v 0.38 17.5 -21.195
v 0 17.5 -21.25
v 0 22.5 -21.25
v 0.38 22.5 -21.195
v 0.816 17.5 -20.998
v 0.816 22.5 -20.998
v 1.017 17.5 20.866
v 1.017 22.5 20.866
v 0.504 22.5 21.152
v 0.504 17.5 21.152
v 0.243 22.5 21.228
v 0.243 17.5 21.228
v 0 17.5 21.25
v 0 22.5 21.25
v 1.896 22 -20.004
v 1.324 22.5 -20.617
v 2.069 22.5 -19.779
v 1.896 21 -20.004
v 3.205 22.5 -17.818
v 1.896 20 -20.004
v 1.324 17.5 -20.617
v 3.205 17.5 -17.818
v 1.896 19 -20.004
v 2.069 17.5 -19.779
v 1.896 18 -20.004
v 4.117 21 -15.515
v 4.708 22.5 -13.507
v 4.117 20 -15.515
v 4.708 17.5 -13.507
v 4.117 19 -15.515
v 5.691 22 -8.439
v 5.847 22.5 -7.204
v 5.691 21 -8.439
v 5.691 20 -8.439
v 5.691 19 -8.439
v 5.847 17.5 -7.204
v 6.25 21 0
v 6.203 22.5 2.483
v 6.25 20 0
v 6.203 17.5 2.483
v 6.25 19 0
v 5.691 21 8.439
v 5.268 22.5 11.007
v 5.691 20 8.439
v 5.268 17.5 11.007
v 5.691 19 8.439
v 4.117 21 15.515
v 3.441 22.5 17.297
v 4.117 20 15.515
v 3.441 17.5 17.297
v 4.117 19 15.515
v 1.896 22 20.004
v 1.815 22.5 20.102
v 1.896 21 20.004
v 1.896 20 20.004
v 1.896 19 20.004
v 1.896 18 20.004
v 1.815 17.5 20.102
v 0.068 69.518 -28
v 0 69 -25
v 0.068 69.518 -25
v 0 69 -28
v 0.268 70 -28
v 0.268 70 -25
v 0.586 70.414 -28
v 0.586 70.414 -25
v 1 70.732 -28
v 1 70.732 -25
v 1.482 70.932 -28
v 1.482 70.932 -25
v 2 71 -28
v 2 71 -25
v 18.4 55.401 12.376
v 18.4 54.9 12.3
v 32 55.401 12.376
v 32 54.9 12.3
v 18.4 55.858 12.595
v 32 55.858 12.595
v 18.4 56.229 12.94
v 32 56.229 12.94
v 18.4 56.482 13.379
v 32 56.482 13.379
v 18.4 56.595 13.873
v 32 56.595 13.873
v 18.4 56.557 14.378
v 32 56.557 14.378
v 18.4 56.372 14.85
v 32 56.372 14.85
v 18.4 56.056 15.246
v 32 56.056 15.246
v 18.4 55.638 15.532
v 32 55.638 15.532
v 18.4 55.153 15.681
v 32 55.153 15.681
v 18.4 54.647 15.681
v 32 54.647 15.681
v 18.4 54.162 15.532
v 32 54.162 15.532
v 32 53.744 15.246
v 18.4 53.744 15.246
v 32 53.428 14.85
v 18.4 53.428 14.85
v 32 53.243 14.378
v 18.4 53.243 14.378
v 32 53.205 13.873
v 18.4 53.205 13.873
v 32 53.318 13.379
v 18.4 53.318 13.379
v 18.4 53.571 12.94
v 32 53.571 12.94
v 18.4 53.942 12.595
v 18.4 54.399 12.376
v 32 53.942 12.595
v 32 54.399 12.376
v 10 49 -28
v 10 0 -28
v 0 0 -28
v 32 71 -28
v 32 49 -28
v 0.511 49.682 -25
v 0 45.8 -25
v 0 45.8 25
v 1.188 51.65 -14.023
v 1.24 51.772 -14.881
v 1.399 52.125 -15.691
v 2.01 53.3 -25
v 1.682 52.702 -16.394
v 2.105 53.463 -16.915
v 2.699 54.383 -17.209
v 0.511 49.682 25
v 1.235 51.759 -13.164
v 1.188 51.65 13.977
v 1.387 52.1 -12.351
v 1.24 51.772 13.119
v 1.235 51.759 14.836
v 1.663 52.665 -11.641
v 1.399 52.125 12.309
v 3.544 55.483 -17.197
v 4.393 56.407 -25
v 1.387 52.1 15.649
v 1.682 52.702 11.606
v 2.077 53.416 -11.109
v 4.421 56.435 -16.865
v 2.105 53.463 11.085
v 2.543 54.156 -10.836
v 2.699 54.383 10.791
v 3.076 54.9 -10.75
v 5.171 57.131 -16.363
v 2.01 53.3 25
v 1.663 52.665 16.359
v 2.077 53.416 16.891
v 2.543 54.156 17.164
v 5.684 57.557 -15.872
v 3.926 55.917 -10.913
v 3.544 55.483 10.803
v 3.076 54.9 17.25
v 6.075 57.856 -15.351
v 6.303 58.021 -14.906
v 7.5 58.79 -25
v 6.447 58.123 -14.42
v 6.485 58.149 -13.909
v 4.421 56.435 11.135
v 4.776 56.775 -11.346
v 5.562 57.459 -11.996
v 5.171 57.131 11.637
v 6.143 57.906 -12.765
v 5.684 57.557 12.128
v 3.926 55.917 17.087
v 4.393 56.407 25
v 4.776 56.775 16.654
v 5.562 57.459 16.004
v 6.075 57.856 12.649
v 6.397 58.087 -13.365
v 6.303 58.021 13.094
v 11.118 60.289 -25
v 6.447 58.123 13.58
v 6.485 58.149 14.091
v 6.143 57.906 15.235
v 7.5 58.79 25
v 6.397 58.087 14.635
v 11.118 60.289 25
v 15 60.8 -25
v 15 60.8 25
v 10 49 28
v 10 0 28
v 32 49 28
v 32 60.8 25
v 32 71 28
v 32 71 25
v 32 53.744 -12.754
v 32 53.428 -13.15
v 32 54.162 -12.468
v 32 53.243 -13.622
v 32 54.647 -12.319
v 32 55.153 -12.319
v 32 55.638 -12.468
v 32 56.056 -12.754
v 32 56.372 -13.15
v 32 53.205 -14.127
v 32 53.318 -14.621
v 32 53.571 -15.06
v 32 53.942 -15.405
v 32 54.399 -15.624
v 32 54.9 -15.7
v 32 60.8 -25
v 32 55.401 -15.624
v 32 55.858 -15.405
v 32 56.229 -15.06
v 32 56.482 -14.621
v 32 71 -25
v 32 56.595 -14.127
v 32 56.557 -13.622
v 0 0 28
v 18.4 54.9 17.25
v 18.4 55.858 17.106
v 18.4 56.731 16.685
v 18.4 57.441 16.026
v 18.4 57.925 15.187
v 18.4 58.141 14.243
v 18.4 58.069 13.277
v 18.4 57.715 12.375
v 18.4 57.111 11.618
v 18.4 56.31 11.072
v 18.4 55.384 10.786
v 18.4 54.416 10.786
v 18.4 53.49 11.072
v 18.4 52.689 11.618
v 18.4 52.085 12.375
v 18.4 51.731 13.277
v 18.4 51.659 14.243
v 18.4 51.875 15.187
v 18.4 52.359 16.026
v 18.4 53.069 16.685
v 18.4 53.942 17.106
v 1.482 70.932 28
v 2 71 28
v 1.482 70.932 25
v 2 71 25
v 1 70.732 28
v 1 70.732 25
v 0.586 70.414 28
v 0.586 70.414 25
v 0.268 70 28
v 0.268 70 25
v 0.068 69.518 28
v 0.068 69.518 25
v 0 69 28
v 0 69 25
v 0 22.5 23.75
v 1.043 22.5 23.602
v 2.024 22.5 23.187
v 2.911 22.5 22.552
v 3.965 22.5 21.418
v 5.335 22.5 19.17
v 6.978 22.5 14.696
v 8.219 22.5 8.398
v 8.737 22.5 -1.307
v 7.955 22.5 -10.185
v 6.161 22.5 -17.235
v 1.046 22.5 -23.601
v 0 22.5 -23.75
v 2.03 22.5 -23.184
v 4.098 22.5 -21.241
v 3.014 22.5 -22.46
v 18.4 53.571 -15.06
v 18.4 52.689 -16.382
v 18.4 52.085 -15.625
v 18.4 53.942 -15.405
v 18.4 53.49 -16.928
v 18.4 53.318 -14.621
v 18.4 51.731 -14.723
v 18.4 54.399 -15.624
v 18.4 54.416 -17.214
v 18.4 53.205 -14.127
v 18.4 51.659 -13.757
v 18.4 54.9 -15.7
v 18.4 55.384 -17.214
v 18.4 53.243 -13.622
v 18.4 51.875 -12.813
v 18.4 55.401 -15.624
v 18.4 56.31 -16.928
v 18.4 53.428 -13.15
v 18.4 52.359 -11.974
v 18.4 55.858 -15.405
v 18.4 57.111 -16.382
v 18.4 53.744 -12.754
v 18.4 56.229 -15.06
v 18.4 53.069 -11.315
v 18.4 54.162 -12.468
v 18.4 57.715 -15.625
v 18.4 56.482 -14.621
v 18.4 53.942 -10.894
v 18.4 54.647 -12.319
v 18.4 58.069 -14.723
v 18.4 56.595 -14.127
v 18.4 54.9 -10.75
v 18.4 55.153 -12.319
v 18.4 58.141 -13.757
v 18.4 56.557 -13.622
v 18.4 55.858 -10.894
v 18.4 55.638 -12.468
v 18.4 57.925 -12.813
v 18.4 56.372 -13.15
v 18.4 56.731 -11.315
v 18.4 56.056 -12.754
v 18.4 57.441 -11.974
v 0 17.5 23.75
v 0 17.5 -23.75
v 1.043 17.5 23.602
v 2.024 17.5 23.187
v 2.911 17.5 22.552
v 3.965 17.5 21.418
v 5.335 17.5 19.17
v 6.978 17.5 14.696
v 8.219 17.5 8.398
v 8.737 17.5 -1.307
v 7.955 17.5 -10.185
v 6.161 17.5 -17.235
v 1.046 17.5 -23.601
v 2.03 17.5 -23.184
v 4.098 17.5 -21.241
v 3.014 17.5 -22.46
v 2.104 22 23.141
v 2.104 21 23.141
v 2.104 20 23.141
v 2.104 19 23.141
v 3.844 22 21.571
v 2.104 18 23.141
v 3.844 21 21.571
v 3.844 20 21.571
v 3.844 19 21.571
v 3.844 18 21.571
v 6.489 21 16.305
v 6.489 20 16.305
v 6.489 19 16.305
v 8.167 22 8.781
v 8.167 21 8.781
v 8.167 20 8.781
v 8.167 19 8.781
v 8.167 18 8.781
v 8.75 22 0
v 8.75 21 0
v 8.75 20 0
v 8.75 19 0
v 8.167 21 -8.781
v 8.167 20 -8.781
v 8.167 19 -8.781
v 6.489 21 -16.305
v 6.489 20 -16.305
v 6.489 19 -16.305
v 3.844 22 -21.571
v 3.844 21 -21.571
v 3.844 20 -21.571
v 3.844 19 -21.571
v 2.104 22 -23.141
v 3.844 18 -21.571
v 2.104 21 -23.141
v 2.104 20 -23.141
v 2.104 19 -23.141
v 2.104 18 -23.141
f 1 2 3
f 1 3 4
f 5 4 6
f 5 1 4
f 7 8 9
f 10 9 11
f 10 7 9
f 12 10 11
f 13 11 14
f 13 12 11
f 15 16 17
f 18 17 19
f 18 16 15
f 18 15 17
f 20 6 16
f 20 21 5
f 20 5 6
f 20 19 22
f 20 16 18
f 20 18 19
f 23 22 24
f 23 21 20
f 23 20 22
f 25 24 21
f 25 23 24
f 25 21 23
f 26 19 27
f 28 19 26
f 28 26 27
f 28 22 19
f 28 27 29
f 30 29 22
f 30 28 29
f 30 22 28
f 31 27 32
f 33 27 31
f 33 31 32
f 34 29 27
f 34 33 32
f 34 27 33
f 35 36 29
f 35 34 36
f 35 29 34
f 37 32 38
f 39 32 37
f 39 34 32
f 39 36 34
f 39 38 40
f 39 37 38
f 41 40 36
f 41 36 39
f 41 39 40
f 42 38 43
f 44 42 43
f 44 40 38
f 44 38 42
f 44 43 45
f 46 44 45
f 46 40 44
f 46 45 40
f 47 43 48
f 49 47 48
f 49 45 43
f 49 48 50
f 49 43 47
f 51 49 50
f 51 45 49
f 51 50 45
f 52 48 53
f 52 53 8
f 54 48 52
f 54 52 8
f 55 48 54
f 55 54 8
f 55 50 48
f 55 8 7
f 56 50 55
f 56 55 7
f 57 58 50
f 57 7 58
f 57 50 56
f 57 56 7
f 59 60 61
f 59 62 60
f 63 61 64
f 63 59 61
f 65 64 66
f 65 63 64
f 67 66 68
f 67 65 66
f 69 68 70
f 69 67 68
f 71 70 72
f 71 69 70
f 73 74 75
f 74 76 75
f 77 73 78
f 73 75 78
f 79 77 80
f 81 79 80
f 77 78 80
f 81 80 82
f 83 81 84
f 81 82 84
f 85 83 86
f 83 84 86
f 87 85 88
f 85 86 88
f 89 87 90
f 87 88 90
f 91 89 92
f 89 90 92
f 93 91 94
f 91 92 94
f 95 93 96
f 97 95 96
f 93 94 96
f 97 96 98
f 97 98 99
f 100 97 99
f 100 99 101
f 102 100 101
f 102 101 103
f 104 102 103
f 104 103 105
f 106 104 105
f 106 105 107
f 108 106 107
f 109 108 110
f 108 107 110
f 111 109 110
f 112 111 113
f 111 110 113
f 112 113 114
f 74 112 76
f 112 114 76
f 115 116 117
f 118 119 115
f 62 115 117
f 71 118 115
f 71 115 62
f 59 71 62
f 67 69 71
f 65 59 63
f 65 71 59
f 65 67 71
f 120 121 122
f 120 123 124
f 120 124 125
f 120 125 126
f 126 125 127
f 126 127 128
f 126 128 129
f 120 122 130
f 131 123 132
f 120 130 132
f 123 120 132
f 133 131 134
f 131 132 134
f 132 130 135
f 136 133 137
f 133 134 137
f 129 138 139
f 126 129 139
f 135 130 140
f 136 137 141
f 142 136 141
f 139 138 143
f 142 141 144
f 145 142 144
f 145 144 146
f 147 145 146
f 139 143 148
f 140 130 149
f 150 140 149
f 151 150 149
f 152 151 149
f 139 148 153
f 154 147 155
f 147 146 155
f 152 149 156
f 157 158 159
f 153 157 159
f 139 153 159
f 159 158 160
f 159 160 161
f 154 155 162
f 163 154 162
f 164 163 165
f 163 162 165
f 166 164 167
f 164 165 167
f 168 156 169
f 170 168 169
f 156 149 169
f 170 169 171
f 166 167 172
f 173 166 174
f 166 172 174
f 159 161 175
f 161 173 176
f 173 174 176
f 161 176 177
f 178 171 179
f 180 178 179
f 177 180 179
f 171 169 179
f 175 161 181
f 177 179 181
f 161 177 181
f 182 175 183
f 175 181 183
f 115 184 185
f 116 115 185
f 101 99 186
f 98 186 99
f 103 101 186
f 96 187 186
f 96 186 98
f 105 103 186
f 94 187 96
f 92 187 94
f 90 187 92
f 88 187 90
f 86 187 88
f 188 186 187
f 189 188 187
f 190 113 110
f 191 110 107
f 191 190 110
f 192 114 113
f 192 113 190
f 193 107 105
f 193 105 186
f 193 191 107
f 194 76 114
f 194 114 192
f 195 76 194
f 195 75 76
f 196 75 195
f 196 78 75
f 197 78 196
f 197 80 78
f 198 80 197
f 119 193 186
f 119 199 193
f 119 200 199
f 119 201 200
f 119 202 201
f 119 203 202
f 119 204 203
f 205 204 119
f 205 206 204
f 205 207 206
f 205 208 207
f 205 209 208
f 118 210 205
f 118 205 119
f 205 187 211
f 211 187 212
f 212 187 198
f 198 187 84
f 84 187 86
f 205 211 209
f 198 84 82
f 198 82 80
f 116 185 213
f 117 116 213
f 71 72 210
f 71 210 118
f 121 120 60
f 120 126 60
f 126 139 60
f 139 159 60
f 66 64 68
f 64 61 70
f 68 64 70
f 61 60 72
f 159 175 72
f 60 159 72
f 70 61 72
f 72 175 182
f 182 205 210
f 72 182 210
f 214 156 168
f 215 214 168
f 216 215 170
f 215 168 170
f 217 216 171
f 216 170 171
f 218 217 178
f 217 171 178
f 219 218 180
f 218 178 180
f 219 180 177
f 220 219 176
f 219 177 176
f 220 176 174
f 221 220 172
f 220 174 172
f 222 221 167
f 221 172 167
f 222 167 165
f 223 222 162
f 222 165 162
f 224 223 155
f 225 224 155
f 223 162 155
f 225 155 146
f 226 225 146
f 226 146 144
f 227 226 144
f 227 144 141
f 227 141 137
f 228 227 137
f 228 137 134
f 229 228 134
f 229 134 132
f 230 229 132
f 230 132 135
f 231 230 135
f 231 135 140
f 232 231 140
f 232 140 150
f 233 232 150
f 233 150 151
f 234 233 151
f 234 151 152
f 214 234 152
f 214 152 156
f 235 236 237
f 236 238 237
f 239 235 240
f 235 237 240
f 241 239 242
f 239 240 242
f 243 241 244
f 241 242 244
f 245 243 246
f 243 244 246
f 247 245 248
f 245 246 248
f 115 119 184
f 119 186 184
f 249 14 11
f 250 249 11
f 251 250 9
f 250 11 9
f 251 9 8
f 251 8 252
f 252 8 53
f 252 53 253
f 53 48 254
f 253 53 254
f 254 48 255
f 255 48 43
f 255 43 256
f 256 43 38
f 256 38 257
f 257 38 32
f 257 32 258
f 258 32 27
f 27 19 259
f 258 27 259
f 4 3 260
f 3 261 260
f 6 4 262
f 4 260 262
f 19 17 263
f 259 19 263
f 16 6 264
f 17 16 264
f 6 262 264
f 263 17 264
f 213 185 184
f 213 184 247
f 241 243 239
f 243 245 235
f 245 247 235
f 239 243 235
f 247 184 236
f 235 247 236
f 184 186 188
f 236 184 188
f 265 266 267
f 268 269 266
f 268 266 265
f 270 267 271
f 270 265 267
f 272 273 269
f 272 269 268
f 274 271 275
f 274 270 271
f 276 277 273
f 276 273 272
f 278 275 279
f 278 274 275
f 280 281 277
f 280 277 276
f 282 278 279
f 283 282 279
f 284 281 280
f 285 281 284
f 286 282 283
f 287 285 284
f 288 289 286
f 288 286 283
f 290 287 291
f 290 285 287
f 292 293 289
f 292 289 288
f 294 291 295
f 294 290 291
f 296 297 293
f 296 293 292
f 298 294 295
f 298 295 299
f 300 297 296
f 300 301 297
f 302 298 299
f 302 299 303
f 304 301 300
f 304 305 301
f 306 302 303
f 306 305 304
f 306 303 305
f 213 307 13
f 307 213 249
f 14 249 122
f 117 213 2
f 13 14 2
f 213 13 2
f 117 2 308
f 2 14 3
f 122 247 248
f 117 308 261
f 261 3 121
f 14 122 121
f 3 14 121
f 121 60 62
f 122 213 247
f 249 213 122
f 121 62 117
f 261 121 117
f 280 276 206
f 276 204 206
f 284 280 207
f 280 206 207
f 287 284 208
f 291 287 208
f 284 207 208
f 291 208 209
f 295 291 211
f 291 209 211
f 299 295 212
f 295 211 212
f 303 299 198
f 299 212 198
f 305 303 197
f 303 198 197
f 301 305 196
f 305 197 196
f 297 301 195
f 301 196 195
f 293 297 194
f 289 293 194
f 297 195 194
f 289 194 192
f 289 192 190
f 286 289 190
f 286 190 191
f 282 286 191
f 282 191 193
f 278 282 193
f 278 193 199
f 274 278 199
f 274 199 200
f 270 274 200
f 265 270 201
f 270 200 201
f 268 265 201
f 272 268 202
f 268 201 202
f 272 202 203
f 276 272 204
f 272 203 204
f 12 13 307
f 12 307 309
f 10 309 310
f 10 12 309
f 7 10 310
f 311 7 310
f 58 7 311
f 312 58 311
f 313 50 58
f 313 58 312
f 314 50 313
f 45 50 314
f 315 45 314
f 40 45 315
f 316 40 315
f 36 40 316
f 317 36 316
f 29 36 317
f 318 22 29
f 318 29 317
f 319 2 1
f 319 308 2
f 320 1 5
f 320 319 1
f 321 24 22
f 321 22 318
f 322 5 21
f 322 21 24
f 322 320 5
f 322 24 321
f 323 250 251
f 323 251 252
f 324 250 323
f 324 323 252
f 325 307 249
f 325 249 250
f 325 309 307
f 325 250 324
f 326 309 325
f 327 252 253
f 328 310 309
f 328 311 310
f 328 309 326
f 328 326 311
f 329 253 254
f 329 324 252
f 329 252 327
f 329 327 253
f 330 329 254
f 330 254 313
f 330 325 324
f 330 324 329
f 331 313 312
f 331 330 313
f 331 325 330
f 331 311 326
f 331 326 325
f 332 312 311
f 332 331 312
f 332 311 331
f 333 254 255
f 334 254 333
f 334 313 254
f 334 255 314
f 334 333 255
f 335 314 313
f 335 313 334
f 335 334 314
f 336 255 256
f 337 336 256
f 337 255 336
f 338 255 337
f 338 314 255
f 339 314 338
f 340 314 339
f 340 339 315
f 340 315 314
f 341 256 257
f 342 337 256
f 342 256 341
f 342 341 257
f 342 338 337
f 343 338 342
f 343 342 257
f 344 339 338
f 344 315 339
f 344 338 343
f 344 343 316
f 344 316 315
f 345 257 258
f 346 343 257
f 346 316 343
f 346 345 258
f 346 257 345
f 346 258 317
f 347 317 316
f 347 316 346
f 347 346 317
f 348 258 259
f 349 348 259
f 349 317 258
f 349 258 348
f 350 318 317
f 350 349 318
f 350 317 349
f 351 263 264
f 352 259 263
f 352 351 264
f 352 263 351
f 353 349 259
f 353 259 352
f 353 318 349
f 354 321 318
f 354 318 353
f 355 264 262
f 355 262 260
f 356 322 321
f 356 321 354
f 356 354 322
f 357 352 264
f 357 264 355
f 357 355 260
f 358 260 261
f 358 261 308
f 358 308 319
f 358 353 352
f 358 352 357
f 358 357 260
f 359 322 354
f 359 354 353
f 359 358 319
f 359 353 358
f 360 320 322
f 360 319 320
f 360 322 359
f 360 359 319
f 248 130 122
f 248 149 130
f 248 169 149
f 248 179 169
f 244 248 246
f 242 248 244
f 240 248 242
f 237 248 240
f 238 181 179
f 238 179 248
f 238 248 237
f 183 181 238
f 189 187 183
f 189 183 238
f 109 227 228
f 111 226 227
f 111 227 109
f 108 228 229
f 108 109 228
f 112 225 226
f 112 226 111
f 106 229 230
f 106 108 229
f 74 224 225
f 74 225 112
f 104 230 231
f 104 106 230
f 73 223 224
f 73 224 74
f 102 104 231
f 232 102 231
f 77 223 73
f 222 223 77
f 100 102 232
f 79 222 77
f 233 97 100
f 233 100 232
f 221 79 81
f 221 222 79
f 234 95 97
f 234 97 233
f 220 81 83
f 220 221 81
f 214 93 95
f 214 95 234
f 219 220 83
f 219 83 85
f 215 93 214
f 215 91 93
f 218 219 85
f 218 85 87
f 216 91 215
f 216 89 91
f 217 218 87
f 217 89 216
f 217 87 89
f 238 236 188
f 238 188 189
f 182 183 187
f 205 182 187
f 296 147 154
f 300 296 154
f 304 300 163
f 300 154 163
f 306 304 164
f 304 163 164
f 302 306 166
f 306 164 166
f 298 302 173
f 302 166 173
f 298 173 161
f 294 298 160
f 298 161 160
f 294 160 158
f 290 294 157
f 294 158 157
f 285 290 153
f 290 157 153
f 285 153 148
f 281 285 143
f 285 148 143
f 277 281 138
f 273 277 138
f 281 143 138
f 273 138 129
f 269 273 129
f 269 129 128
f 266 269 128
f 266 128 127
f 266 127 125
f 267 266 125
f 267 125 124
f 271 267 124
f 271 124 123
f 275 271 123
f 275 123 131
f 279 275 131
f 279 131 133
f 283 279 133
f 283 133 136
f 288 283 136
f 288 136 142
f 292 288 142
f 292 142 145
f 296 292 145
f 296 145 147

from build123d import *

# Parameters (mm, degrees)
BOSS_EXTRUDE1_DEPTH                                 = 28
CBORE_FOR_M3_HEX_SOCKET_HEAD_CAP_SCREW1_D           = 3.4
CBORE_FOR_M3_HEX_SOCKET_HEAD_CAP_SCREW1_CBORE_D     = 6.5
CBORE_FOR_M3_HEX_SOCKET_HEAD_CAP_SCREW1_CBORE_DEPTH = 18.4
SKETCH5_W                                           = 3
SKETCH5_H                                           = 10.2
BOSS_EXTRUDE3_DEPTH                                 = 32
FILLET1_R                                           = 15
CUT_SWEEP1_START                                    = 17.5
CUT_SWEEP1_DEPTH                                    = 5
FILLET2_R                                           = 2


# Read off the part's stored shape, not the designer's step: Cut-Sweep1
with BuildPart() as part:
    # Sketch1 → Boss-Extrude1 (new, symmetric)
    with BuildSketch(Plane.XY):
        Polygon((0, 0), (0, 60.8), (32, 60.8), (32, 49), (10, 49), (10, 0), align=None)
    extrude(amount=BOSS_EXTRUDE1_DEPTH, both=True)

    # CBORE for M3 Hex Socket Head Cap Screw1 (through all)
    with Locations(Plane.ZY):
        with Locations((14, 54.9), (-14, 54.9)):
            CounterBoreHole(CBORE_FOR_M3_HEX_SOCKET_HEAD_CAP_SCREW1_D / 2, CBORE_FOR_M3_HEX_SOCKET_HEAD_CAP_SCREW1_CBORE_D / 2, CBORE_FOR_M3_HEX_SOCKET_HEAD_CAP_SCREW1_CBORE_DEPTH)

    # Sketch5 → Boss-Extrude3 (add)
    with BuildSketch(Plane(origin=(32, 0, 0), x_dir=(0, 0, -1), z_dir=(1, 0, 0))):
        with Locations((-26.5, 65.9)):
            Rectangle(SKETCH5_W, SKETCH5_H)
        with Locations((26.5, 65.9)):
            Rectangle(SKETCH5_W, SKETCH5_H)
    extrude(amount=-BOSS_EXTRUDE3_DEPTH)

    # Fillet1
    # the kernel refuses this fillet: 15 mm, written as the material it takes off along each edge
    with BuildSketch(Plane(origin=(0, 60.8, 25), x_dir=(0, -1, 0), z_dir=(0, 0, -1))) as fillet1_piece_1:
        with BuildLine():
            CenterArc((FILLET1_R, -FILLET1_R), FILLET1_R, 90, 90)
            Line((0, -FILLET1_R), (0, 0))
            Line((0, 0), (FILLET1_R, 0))
        make_face()
    extrude(amount=50, mode=Mode.SUBTRACT)

    # Cut-Sweep1 outline → Cut-Sweep1 (cut)
    with BuildSketch(Plane(origin=(0, 0, 0), x_dir=(1, 0, 0), z_dir=(0, 1, 0)).offset(CUT_SWEEP1_START)):
        with BuildLine():
            add(Edge.make_bspline(
                [(0, 21.25), (0.24543691, 21.25), (0.503005998, 21.185067302), (1.142972539, 20.803030792), (1.513644961, 20.479106412), (2.661593441, 19.052618916), (3.454291906, 17.504082361), (4.780601567, 13.525153377), (5.323721278, 11.098345132), (6.057965891, 5.780475225), (6.25, 2.890701574), (6.25, -2.890701574), (6.057965891, -5.780475225), (5.323721278, -11.098345132), (4.780601567, -13.525153377), (3.454291906, -17.504082361), (2.661593441, -19.052618916), (1.513644961, -20.479106412), (1.142972539, -20.803030792), (0.503005998, -21.185067302), (0.24543691, -21.25), (0, -21.25)],
                knots=[0.75, 0.75, 0.75, 0.75, 0.78125, 0.78125, 0.8125, 0.8125, 0.875, 0.875, 0.9375, 0.9375, 1, 1, 1.0625, 1.0625, 1.125, 1.125, 1.1875, 1.1875, 1.21875, 1.21875, 1.25, 1.25, 1.25, 1.25], degree=3))
            Line((0, -21.25), (0, -23.75))
            add(Edge.make_bspline(
                [(0, -23.75), (0.736310661, -23.75), (1.461325008, -23.524563287), (2.747539499, -22.756740545), (3.319589998, -22.222568191), (4.892691098, -20.267768767), (5.763908978, -18.480925296), (7.214400985, -14.129449273), (7.783074584, -11.564508722), (8.551624223, -5.998179833), (8.75, -2.999784652), (8.75, 2.999784652), (8.551624223, 5.998179833), (7.783074584, 11.564508722), (7.214400985, 14.129449273), (5.763908978, 18.480925296), (4.892691098, 20.267768767), (3.319589998, 22.222568191), (2.747539499, 22.756740545), (1.461325008, 23.524563287), (0.736310661, 23.75), (0, 23.75)],
                knots=[0, 0, 0, 0, 0.03125, 0.03125, 0.0625, 0.0625, 0.125, 0.125, 0.1875, 0.1875, 0.25, 0.25, 0.3125, 0.3125, 0.375, 0.375, 0.4375, 0.4375, 0.46875, 0.46875, 0.5, 0.5, 0.5, 0.5], degree=3))
            Line((0, 23.75), (0, 21.25))
        make_face()
    extrude(amount=CUT_SWEEP1_DEPTH, mode=Mode.SUBTRACT)

    # Fillet2
    fillet2_edges = [part.edges().sort_by_distance(p)[0] for p in [
        (0, 71, 26.5),
        (0, 71, -26.5),
    ]]
    fillet(fillet2_edges, radius=FILLET2_R)


solid = part.part
